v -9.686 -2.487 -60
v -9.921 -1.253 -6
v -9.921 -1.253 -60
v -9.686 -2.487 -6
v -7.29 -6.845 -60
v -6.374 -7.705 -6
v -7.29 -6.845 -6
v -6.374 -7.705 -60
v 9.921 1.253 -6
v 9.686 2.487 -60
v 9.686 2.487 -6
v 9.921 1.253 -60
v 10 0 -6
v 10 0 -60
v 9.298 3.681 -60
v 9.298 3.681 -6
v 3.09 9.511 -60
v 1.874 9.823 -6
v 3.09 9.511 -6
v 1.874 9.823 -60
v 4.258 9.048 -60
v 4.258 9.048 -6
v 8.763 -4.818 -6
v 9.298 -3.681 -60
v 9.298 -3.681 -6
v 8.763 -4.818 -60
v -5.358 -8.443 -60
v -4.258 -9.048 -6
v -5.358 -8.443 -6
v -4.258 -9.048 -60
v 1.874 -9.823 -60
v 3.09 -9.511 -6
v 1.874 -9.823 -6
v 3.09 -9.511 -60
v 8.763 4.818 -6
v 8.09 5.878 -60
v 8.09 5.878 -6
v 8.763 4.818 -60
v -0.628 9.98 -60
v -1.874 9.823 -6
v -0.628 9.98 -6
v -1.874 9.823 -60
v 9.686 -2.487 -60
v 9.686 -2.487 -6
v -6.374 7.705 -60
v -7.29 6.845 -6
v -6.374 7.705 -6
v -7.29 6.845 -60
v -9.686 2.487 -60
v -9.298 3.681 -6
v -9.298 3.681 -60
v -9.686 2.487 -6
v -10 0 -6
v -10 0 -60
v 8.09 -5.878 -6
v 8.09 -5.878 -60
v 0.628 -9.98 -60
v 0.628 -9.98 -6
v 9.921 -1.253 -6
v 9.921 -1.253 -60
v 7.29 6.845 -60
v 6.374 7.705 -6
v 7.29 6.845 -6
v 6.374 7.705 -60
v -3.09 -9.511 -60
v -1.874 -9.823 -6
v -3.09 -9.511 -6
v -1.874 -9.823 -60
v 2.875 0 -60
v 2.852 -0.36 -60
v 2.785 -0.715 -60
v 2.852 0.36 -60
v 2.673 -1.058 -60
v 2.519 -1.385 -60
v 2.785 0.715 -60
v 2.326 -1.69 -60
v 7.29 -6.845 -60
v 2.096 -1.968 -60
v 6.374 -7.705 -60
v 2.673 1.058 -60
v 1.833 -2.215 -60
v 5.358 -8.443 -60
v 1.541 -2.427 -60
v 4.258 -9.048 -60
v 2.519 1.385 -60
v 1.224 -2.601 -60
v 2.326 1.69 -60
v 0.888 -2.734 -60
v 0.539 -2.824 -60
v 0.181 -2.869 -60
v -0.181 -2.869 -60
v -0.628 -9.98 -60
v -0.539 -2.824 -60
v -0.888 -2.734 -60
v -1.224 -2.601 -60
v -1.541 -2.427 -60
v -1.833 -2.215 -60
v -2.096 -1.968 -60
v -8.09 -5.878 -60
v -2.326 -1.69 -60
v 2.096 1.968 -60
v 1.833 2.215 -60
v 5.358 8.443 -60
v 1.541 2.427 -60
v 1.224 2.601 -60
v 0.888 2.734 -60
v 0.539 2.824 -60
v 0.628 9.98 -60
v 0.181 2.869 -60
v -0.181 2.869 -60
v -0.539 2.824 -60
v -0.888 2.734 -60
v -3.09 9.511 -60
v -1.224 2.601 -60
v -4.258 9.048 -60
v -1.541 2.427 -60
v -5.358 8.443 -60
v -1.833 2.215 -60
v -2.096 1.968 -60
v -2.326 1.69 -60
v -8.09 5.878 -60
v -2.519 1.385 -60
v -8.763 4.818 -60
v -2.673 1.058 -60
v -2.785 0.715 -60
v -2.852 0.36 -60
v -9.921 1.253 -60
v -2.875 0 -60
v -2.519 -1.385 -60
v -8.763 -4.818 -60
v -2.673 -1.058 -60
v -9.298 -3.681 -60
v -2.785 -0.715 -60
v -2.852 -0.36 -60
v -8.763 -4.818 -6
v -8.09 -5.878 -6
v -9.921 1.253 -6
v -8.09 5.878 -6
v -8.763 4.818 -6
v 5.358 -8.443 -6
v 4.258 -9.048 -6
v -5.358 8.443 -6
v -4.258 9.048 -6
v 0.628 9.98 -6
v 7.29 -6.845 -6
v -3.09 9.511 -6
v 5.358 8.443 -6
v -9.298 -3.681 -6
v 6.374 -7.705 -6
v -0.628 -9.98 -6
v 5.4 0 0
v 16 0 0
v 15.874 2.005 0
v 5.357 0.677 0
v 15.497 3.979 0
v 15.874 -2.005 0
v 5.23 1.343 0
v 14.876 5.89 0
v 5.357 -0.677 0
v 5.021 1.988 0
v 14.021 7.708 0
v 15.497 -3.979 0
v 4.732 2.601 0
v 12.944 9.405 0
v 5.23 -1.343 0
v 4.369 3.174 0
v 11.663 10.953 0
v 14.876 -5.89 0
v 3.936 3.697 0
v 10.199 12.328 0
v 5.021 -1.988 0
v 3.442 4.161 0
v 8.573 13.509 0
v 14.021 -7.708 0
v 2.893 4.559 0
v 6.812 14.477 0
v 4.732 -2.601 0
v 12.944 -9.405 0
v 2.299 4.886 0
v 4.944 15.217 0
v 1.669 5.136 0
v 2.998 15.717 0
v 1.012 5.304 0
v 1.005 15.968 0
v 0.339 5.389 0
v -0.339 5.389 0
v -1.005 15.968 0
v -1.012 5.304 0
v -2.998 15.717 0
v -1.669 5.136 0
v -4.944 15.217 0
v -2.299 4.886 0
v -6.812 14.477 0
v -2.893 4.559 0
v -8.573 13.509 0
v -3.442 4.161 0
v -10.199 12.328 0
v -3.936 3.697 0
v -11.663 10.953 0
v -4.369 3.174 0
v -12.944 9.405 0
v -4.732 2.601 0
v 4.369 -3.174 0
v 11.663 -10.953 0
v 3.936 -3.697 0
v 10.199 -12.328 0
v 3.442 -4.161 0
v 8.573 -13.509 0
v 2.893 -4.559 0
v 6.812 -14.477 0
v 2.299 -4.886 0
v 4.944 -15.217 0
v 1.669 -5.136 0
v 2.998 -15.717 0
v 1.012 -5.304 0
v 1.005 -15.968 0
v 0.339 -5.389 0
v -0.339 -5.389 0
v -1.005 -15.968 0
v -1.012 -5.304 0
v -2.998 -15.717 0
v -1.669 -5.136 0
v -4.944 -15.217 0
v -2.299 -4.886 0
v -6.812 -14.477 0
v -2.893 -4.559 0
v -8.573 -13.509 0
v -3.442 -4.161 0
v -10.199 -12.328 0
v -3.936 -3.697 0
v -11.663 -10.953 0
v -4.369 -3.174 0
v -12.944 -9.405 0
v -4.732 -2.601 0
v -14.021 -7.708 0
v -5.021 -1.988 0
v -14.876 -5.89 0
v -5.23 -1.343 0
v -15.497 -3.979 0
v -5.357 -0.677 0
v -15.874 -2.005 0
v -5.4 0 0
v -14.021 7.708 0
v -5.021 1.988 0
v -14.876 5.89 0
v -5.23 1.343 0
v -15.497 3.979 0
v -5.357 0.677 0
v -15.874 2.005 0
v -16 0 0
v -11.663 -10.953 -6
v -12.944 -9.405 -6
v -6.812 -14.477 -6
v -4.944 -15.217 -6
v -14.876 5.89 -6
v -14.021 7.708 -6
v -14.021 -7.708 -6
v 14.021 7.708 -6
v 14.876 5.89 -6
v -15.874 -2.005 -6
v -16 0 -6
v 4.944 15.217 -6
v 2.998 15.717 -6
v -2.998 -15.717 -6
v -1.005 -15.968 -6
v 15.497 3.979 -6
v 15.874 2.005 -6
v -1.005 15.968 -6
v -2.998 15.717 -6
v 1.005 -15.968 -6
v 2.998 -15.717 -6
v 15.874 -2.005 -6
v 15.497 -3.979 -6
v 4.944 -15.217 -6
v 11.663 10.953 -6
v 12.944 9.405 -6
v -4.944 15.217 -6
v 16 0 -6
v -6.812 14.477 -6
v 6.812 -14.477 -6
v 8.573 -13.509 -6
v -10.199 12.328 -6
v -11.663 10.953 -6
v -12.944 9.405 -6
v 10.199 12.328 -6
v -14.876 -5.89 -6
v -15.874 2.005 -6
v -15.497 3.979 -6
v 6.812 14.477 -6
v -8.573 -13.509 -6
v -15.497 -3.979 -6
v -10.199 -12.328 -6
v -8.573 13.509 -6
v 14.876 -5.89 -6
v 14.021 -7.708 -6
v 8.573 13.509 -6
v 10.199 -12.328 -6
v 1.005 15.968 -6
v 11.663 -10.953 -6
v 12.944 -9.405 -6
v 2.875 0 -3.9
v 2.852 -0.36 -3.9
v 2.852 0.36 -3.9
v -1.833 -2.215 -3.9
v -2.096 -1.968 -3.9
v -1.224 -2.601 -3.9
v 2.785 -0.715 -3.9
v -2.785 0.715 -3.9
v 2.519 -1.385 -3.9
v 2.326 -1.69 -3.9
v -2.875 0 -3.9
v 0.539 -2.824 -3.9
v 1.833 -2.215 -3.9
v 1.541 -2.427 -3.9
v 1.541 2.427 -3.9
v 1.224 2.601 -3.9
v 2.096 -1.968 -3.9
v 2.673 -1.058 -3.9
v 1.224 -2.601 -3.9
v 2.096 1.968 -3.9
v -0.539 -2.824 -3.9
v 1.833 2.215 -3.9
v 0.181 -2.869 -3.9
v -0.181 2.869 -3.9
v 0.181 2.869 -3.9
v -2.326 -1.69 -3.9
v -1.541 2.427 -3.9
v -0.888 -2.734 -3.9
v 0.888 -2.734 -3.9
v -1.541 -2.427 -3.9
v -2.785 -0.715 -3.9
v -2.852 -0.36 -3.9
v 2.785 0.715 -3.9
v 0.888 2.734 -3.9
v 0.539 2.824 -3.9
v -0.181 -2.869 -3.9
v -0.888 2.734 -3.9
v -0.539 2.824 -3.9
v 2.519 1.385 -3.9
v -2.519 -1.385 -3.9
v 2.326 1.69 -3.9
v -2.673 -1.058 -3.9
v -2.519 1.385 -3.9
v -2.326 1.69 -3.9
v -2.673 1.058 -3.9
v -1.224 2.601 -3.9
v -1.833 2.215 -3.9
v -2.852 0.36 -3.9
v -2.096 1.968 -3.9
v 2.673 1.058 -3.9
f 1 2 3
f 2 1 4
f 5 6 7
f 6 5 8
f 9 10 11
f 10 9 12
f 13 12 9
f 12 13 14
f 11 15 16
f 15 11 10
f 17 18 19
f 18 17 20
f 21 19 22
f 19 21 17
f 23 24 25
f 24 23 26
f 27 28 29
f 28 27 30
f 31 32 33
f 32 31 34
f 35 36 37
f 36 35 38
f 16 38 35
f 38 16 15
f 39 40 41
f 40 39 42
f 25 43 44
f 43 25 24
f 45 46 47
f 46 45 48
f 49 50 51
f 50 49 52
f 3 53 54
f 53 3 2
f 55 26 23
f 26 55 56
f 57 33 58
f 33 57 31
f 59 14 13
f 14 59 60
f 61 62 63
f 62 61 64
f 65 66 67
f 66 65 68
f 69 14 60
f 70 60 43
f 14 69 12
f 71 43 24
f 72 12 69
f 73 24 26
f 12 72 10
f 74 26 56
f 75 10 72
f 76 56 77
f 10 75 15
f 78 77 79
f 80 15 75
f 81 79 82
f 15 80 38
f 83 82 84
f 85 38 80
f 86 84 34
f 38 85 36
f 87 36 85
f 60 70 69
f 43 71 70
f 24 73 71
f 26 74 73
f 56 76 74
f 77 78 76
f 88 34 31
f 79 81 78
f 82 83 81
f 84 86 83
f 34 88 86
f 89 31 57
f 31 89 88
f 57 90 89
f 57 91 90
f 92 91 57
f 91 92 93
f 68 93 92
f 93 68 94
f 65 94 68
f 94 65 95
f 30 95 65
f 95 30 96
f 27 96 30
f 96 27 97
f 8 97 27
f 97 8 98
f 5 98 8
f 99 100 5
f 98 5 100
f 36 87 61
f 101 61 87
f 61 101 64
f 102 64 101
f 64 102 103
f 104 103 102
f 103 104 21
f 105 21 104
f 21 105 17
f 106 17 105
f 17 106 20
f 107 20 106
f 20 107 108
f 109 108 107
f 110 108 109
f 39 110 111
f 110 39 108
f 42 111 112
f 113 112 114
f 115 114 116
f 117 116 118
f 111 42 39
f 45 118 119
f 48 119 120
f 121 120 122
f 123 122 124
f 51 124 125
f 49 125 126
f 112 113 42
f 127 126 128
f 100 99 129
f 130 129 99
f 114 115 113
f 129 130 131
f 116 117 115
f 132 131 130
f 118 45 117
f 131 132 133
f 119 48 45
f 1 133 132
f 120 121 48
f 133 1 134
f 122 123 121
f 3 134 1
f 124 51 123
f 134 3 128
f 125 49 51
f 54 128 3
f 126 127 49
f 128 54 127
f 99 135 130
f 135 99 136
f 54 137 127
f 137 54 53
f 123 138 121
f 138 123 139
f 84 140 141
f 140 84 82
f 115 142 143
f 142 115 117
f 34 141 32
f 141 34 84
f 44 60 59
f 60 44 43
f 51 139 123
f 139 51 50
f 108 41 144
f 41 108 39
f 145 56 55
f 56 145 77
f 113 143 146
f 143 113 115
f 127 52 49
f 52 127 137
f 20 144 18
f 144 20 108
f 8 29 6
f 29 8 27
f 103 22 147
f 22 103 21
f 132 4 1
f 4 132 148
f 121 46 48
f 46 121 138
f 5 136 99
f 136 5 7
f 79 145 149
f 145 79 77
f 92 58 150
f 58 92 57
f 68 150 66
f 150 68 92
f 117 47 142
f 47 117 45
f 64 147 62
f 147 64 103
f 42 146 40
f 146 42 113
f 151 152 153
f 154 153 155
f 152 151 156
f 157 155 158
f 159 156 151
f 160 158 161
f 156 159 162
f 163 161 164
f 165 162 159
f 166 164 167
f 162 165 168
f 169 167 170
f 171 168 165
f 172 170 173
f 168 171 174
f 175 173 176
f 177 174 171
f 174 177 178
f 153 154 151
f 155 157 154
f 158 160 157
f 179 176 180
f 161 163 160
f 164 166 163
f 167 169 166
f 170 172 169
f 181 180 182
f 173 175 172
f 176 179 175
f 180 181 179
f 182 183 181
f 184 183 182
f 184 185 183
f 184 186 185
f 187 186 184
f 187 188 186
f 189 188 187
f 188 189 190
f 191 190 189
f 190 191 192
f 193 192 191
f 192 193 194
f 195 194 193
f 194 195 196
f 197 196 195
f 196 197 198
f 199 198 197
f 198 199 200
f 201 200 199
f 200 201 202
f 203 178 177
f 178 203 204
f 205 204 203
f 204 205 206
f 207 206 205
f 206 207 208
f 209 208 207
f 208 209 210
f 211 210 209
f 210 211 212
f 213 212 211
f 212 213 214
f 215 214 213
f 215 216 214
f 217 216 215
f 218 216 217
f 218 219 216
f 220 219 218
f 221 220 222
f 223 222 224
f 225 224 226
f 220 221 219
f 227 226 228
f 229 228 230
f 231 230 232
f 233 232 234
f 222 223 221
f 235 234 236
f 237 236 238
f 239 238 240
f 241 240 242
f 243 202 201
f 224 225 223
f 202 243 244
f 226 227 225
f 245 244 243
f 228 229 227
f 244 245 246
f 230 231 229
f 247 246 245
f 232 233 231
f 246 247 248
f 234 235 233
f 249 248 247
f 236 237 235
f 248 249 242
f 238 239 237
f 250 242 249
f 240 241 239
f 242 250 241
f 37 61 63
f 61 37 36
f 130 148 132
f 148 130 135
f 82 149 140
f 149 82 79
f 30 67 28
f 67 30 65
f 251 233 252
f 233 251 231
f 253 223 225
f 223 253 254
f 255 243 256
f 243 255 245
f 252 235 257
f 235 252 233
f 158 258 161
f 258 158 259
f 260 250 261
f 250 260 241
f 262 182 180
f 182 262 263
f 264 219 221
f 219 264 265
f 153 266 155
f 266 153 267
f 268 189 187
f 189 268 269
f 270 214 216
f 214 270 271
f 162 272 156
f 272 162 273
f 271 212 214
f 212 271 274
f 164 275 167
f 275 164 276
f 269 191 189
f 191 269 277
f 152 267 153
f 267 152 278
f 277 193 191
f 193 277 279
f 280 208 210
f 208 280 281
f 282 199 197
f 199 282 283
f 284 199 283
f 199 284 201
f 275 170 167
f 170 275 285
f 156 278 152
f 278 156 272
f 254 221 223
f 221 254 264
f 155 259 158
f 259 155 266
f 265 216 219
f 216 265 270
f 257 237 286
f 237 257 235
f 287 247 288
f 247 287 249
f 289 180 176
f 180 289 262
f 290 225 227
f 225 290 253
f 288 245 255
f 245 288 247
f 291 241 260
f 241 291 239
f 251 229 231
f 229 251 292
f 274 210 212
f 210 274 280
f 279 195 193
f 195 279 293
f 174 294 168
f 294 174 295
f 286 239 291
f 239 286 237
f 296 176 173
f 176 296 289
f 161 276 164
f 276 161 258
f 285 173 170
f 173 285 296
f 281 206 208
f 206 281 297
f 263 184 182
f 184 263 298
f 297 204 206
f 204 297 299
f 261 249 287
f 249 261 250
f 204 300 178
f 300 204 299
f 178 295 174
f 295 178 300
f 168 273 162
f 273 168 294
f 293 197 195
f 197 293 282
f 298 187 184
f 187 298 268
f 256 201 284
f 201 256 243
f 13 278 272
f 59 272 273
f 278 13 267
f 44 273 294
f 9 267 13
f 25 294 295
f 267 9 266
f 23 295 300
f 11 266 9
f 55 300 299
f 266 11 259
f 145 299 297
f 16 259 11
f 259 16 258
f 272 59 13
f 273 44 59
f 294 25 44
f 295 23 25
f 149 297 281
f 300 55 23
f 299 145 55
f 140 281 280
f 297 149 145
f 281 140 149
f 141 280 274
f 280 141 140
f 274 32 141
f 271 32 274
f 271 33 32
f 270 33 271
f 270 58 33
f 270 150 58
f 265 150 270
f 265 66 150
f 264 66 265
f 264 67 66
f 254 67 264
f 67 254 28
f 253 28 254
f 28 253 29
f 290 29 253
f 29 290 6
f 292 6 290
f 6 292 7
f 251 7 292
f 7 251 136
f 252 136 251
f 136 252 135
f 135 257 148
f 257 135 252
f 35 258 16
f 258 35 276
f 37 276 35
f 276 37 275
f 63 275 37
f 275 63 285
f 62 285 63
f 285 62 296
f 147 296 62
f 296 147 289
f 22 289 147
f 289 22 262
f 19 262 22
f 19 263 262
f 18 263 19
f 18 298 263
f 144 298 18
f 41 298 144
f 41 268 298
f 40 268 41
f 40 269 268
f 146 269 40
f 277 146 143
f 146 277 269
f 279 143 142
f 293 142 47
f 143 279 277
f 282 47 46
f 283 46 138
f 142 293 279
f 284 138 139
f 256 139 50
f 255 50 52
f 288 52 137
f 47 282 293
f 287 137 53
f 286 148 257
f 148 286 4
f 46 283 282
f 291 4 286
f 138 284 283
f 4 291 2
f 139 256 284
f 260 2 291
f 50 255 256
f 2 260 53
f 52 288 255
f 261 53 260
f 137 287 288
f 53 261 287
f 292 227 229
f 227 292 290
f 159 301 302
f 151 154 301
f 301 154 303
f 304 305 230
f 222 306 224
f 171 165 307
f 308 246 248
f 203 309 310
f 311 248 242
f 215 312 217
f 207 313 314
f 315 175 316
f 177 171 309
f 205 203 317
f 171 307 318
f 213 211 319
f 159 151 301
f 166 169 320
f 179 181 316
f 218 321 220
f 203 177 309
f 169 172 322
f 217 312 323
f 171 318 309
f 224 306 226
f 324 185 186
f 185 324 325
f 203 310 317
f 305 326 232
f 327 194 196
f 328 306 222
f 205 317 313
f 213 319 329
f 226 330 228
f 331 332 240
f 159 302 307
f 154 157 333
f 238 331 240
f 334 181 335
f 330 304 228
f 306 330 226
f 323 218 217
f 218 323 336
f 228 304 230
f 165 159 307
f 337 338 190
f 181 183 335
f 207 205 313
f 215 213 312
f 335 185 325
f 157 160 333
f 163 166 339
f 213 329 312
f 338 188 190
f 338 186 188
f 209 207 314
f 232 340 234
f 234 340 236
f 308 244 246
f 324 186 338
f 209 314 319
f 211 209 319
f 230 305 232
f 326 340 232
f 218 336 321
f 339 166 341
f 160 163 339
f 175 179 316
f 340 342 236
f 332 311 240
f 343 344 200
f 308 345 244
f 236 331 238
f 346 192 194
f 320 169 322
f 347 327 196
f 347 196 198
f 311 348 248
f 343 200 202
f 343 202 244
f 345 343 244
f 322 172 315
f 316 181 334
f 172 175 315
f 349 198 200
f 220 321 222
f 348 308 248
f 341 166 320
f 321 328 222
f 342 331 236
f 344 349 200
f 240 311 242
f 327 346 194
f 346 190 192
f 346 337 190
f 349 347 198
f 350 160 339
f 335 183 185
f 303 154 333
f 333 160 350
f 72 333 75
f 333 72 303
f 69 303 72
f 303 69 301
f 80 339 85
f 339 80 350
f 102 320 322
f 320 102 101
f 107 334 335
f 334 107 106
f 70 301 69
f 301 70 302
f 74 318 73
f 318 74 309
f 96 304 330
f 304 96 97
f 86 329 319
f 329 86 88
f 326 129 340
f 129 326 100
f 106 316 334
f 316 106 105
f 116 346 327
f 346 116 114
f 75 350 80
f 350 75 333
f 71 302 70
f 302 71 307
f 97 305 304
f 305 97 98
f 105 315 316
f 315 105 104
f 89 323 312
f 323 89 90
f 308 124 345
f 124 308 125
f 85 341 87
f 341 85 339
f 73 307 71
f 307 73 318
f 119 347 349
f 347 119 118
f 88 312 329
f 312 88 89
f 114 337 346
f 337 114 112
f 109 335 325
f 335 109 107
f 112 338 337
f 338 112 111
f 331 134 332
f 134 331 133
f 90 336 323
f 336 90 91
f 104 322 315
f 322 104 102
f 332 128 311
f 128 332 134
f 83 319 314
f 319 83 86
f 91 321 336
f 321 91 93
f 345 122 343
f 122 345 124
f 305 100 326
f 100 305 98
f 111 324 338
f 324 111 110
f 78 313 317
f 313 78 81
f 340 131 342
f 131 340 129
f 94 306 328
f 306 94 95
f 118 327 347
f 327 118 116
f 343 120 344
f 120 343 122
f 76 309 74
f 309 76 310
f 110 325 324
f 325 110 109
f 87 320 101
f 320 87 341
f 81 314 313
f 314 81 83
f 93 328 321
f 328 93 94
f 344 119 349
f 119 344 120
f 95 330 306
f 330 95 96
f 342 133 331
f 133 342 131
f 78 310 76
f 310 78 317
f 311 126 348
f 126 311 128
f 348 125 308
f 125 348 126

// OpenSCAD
$fn = 50;


difference() {
	union() {
		translate(v = [0, 0, -60.0000000000]) {
			cylinder(h = 60, r = 10.0000000000);
		}
		translate(v = [0, 0, -6.0000000000]) {
			cylinder(h = 6, r = 16.0000000000);
		}
	}
	union() {
		translate(v = [0, 0, 0]) {
			rotate(a = [0, 0, 0]) {
				difference() {
					union() {
						#translate(v = [0, 0, -60.0000000000]) {
							cylinder(h = 60, r = 2.6000000000);
						}
						#translate(v = [0, 0, -3.9000000000]) {
							cylinder(h = 3.9000000000, r = 10.0000000000, r1 = 2.8750000000, r2 = 5.4000000000);
						}
						#translate(v = [0, 0, -60.0000000000]) {
							cylinder(h = 60, r = 2.8750000000);
						}
						#translate(v = [0, 0, -60.0000000000]) {
							cylinder(h = 60, r = 2.6000000000);
						}
					}
					union();
				}
			}
		}
	}
}
